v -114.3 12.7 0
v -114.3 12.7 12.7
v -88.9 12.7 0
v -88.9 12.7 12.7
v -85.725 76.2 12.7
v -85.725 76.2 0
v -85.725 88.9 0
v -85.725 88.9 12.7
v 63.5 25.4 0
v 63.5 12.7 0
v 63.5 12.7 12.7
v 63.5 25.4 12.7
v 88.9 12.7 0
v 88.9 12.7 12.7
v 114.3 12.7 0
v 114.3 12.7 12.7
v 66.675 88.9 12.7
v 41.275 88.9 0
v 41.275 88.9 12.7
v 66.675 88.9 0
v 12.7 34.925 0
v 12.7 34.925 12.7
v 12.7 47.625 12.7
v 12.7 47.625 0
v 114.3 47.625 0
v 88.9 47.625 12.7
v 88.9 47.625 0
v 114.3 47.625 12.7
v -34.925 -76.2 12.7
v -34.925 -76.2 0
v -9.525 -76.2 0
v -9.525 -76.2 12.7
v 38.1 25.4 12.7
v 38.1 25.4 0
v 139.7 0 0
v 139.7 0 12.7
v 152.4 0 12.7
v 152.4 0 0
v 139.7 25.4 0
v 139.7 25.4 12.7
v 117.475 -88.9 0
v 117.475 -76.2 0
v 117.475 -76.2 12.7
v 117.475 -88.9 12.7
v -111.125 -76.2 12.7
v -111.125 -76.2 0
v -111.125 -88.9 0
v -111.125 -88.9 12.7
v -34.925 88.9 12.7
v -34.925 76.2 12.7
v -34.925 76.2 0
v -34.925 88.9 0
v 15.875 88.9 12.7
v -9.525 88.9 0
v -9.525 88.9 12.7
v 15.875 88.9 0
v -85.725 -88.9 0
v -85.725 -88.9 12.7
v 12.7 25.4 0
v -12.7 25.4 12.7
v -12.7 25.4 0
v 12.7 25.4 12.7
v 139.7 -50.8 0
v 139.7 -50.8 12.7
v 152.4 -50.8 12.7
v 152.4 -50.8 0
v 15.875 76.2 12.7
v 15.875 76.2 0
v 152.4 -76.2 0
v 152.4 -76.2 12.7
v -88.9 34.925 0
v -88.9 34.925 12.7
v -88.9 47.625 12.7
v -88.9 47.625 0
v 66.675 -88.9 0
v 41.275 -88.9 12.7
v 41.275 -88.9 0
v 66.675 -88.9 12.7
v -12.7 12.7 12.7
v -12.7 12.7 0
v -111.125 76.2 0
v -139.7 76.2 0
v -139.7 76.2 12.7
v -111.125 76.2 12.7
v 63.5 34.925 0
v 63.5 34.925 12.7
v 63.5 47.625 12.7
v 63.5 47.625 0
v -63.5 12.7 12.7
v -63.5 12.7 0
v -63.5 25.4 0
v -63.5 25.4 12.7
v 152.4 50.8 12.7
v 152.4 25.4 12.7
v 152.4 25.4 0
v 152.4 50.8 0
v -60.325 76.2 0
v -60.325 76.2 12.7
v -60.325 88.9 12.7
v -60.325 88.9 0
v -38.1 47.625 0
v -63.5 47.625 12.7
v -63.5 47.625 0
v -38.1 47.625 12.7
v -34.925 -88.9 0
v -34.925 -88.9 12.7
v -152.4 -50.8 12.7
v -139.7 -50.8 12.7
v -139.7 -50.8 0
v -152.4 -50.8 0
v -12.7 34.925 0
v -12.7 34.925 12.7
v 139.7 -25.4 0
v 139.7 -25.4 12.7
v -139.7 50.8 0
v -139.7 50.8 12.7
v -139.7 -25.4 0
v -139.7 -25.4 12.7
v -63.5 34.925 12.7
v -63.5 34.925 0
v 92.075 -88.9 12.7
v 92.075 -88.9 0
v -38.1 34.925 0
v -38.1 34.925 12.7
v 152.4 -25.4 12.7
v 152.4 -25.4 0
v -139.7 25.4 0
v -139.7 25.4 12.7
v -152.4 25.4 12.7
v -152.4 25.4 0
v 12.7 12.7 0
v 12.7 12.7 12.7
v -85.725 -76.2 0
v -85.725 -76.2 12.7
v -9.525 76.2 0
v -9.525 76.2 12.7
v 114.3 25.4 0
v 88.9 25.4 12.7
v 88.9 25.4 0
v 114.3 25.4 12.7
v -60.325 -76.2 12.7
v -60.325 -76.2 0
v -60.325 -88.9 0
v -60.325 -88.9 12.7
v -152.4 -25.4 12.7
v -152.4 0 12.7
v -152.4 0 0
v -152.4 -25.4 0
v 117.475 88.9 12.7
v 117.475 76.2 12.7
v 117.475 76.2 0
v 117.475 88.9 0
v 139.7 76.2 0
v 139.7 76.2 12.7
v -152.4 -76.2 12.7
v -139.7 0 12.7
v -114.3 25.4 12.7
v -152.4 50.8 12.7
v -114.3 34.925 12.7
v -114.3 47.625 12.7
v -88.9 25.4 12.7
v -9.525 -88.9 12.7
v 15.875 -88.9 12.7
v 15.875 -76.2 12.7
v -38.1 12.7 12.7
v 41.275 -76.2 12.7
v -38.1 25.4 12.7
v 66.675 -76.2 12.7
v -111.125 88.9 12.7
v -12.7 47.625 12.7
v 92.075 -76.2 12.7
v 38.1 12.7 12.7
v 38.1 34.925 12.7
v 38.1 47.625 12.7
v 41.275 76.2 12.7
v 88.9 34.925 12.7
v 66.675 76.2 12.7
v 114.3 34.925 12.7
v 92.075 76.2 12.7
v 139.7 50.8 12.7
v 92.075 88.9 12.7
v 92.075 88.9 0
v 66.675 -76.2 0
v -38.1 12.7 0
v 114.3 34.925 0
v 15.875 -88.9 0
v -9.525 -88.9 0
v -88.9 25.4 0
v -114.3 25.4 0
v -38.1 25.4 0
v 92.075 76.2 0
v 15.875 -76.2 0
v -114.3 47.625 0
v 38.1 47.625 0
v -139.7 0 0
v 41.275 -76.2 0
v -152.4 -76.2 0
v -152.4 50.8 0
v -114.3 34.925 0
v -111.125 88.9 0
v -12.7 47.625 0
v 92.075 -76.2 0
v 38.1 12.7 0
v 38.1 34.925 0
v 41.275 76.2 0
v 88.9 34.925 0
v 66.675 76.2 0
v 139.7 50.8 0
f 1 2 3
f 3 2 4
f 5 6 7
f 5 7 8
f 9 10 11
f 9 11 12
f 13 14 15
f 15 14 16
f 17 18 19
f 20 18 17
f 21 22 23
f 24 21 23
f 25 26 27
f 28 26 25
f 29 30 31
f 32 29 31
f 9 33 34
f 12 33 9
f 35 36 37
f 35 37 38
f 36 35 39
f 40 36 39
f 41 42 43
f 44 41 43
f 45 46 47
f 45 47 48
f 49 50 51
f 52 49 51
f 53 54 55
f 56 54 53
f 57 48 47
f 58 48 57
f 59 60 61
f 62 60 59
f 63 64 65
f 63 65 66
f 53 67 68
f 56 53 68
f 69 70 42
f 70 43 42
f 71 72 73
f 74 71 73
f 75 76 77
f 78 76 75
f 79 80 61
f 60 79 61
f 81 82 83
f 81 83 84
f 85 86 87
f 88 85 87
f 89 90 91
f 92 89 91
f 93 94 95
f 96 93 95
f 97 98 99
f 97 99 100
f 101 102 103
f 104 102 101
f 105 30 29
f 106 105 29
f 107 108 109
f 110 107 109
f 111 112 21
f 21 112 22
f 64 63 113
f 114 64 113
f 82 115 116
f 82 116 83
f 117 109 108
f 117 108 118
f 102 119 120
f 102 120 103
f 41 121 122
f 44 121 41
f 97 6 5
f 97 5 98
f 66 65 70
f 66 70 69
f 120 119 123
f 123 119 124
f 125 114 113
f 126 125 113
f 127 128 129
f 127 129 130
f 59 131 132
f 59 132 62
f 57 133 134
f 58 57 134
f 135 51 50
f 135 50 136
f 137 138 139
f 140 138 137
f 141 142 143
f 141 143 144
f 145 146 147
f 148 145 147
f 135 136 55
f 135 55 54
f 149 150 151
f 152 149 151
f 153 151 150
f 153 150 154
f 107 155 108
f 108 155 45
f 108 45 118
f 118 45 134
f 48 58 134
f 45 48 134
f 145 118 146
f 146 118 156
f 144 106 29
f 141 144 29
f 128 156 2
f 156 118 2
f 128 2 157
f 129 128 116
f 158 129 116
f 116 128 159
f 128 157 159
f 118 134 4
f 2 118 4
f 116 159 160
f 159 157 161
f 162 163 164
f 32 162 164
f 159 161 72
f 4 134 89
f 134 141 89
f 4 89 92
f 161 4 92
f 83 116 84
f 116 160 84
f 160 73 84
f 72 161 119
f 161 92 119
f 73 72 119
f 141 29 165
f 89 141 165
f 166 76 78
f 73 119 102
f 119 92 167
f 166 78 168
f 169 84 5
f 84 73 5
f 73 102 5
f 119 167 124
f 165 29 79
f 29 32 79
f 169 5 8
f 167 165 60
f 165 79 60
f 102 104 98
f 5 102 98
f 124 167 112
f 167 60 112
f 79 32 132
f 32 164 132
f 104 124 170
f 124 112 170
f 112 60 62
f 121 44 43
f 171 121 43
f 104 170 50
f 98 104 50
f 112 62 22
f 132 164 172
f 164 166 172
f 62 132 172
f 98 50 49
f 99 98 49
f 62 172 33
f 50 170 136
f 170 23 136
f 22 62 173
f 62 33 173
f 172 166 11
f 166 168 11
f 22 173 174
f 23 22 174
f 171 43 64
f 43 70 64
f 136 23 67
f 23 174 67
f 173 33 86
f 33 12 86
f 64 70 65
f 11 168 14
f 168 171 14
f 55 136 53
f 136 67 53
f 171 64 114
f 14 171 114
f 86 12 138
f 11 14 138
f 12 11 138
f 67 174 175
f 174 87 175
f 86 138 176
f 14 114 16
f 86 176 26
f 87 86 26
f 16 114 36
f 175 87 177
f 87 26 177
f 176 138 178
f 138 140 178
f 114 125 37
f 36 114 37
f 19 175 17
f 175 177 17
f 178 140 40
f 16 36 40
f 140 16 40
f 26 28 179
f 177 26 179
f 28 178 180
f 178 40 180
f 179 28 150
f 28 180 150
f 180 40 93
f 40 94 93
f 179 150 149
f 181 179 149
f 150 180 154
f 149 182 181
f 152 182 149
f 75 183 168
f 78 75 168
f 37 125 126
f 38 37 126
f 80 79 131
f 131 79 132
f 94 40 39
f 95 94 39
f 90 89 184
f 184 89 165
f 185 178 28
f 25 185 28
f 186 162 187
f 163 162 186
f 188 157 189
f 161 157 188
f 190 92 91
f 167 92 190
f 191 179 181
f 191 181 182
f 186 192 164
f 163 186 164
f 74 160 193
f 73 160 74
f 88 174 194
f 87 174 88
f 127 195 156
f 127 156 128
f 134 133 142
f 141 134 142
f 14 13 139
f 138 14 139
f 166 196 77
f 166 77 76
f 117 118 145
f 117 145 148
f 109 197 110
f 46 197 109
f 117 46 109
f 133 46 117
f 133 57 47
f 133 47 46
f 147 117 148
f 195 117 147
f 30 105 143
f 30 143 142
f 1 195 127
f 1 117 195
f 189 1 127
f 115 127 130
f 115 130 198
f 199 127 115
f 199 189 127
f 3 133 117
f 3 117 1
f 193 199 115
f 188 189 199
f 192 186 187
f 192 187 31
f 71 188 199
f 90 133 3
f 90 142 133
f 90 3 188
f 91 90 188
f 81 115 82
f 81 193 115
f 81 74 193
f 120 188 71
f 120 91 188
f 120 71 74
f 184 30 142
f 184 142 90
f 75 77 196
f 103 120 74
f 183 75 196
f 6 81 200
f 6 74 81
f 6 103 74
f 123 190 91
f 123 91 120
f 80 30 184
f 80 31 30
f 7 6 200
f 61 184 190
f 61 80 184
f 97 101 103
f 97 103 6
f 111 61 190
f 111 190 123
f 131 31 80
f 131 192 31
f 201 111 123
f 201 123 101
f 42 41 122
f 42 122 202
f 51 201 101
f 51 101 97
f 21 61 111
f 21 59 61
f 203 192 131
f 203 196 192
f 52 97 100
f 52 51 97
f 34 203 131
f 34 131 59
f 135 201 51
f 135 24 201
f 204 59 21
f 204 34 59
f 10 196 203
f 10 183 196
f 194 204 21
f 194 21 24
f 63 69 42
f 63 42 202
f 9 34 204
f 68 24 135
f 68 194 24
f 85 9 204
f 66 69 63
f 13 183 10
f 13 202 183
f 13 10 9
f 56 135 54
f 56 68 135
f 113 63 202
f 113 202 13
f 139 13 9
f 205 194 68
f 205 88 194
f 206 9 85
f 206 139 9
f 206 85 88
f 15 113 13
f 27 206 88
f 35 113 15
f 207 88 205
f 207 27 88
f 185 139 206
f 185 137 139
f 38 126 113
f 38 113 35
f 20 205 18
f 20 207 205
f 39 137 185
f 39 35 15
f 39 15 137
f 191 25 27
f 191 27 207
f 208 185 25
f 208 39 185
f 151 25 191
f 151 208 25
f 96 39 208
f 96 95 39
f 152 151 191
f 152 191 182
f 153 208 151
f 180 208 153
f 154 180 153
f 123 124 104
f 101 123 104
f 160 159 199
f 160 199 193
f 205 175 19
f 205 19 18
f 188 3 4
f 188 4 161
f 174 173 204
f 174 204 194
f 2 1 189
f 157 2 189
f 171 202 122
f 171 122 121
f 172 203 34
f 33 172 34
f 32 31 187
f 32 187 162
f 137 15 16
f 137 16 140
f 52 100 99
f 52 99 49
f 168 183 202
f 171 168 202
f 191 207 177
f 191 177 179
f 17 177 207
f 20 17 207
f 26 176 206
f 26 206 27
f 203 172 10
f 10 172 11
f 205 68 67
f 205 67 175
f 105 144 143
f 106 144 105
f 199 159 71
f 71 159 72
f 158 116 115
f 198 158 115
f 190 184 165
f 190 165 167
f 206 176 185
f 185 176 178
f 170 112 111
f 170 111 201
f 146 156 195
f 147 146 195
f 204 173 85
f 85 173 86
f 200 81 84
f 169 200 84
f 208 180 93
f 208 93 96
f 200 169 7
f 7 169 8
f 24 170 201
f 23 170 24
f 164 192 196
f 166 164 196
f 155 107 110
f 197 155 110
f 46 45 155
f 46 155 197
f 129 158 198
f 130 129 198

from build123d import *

# Parameters (mm, degrees)
SKETCH1_W               = 279.4
SKETCH1_H               = 152.4
BOSS_EXTRUDE1_DEPTH     = 12.7
SKETCH2_W               = 25.4
SKETCH2_H               = 12.7
BOSS_EXTRUDE2_DEPTH     = 12.7
LPATTERN1_COUNT         = 5
LPATTERN1_PITCH         = 50.8
MIRROR1_COPY_1_SKETCH_W = 25.4
MIRROR1_COPY_1_SKETCH_H = 12.7
MIRROR1_COPY_1_DEPTH    = 12.7
MIRROR1_COPY_2_SKETCH_W = 25.4
MIRROR1_COPY_2_SKETCH_H = 12.7
MIRROR1_COPY_2_DEPTH    = 12.7
MIRROR1_COPY_3_SKETCH_W = 25.4
MIRROR1_COPY_3_SKETCH_H = 12.7
MIRROR1_COPY_3_DEPTH    = 12.7
MIRROR1_COPY_4_SKETCH_W = 25.4
MIRROR1_COPY_4_SKETCH_H = 12.7
MIRROR1_COPY_4_DEPTH    = 12.7
SKETCH3_W               = 12.7
SKETCH3_H               = 25.4
BOSS_EXTRUDE3_DEPTH     = 12.7
LPATTERN2_COUNT         = 3
LPATTERN2_PITCH         = 50.8
MIRROR2_COPY_1_SKETCH_W = 12.7
MIRROR2_COPY_1_SKETCH_H = 25.4
MIRROR2_COPY_1_DEPTH    = 12.7
MIRROR2_COPY_2_SKETCH_W = 12.7
MIRROR2_COPY_2_SKETCH_H = 25.4
MIRROR2_COPY_2_DEPTH    = 12.7
SKETCH4_W               = 25.4
SKETCH4_H               = 12.7
CUT_EXTRUDE1_DEPTH      = 13.7
LPATTERN3_COUNT         = 5
LPATTERN3_PITCH         = 50.8


with BuildPart() as part:
    # Sketch1 → Boss-Extrude1 (new body)
    with BuildSketch(Plane.XY):
        Rectangle(SKETCH1_W, SKETCH1_H)
    extrude(amount=BOSS_EXTRUDE1_DEPTH)

    # Sketch2 → Boss-Extrude2 (add)
    with BuildSketch(Plane.XZ.offset(76.2)):
        with Locations((-98.425, 6.35)):
            Rectangle(SKETCH2_W, SKETCH2_H)
    boss_extrude2 = extrude(amount=BOSS_EXTRUDE2_DEPTH)

    # LPattern1: Boss-Extrude2 ×5
    with Locations(*[(i * LPATTERN1_PITCH, 0, 0) for i in range(1, LPATTERN1_COUNT)]):
        add(boss_extrude2)

    # Mirror1: Boss-Extrude2 across plane
    add(boss_extrude2.mirror(Plane.ZX))

    # Mirror1 copy 1 sketch → Mirror1 copy 1 (add)
    with BuildSketch(Plane(origin=(50.8, 76.2, 0), x_dir=(1, 0, 0), z_dir=(0, 1, 0))):
        with Locations((-98.425, -6.35)):
            Rectangle(MIRROR1_COPY_1_SKETCH_W, MIRROR1_COPY_1_SKETCH_H)
    extrude(amount=MIRROR1_COPY_1_DEPTH)

    # Mirror1 copy 2 sketch → Mirror1 copy 2 (add)
    with BuildSketch(Plane(origin=(101.6, 76.2, 0), x_dir=(1, 0, 0), z_dir=(0, 1, 0))):
        with Locations((-98.425, -6.35)):
            Rectangle(MIRROR1_COPY_2_SKETCH_W, MIRROR1_COPY_2_SKETCH_H)
    extrude(amount=MIRROR1_COPY_2_DEPTH)

    # Mirror1 copy 3 sketch → Mirror1 copy 3 (add)
    with BuildSketch(Plane(origin=(152.4, 76.2, 0), x_dir=(1, 0, 0), z_dir=(0, 1, 0))):
        with Locations((-98.425, -6.35)):
            Rectangle(MIRROR1_COPY_3_SKETCH_W, MIRROR1_COPY_3_SKETCH_H)
    extrude(amount=MIRROR1_COPY_3_DEPTH)

    # Mirror1 copy 4 sketch → Mirror1 copy 4 (add)
    with BuildSketch(Plane(origin=(203.2, 76.2, 0), x_dir=(1, 0, 0), z_dir=(0, 1, 0))):
        with Locations((-98.425, -6.35)):
            Rectangle(MIRROR1_COPY_4_SKETCH_W, MIRROR1_COPY_4_SKETCH_H)
    extrude(amount=MIRROR1_COPY_4_DEPTH)

    # Sketch3 → Boss-Extrude3 (add)
    with BuildSketch(Plane(origin=(139.7, 0, 0), x_dir=(0, 0, -1), z_dir=(1, 0, 0))):
        with Locations((-6.35, -63.5)):
            Rectangle(SKETCH3_W, SKETCH3_H)
    boss_extrude3 = extrude(amount=BOSS_EXTRUDE3_DEPTH)

    # LPattern2: Boss-Extrude3 ×3
    with Locations(*[(0, i * LPATTERN2_PITCH, 0) for i in range(1, LPATTERN2_COUNT)]):
        add(boss_extrude3)

    # Mirror2: Boss-Extrude3 across plane
    add(boss_extrude3.mirror(Plane(origin=(0, 0, 0), x_dir=(0, 0, 1), z_dir=(1, 0, 0))))

    # Mirror2 copy 1 sketch → Mirror2 copy 1 (add)
    with BuildSketch(Plane(origin=(-139.7, 50.8, 0), x_dir=(0, 0, -1), z_dir=(-1, 0, 0))):
        with Locations((-6.35, 63.5)):
            Rectangle(MIRROR2_COPY_1_SKETCH_W, MIRROR2_COPY_1_SKETCH_H)
    extrude(amount=MIRROR2_COPY_1_DEPTH)

    # Mirror2 copy 2 sketch → Mirror2 copy 2 (add)
    with BuildSketch(Plane(origin=(-139.7, 101.6, 0), x_dir=(0, 0, -1), z_dir=(-1, 0, 0))):
        with Locations((-6.35, 63.5)):
            Rectangle(MIRROR2_COPY_2_SKETCH_W, MIRROR2_COPY_2_SKETCH_H)
    extrude(amount=MIRROR2_COPY_2_DEPTH)

    # Sketch4 → Cut-Extrude1 (cut, through all)
    with BuildSketch(Plane.XY.offset(12.7)):
        with Locations((-101.6, 19.05)):
            Rectangle(SKETCH4_W, SKETCH4_H)
        with Locations((-101.6, 41.275)):
            Rectangle(SKETCH4_W, SKETCH4_H)
    cut_extrude1 = extrude(amount=-CUT_EXTRUDE1_DEPTH, mode=Mode.SUBTRACT)

    # LPattern3: Cut-Extrude1 ×5
    with Locations(*[(i * LPATTERN3_PITCH, 0, 0) for i in range(1, LPATTERN3_COUNT)]):
        add(cut_extrude1, mode=Mode.SUBTRACT)


solid = part.part
